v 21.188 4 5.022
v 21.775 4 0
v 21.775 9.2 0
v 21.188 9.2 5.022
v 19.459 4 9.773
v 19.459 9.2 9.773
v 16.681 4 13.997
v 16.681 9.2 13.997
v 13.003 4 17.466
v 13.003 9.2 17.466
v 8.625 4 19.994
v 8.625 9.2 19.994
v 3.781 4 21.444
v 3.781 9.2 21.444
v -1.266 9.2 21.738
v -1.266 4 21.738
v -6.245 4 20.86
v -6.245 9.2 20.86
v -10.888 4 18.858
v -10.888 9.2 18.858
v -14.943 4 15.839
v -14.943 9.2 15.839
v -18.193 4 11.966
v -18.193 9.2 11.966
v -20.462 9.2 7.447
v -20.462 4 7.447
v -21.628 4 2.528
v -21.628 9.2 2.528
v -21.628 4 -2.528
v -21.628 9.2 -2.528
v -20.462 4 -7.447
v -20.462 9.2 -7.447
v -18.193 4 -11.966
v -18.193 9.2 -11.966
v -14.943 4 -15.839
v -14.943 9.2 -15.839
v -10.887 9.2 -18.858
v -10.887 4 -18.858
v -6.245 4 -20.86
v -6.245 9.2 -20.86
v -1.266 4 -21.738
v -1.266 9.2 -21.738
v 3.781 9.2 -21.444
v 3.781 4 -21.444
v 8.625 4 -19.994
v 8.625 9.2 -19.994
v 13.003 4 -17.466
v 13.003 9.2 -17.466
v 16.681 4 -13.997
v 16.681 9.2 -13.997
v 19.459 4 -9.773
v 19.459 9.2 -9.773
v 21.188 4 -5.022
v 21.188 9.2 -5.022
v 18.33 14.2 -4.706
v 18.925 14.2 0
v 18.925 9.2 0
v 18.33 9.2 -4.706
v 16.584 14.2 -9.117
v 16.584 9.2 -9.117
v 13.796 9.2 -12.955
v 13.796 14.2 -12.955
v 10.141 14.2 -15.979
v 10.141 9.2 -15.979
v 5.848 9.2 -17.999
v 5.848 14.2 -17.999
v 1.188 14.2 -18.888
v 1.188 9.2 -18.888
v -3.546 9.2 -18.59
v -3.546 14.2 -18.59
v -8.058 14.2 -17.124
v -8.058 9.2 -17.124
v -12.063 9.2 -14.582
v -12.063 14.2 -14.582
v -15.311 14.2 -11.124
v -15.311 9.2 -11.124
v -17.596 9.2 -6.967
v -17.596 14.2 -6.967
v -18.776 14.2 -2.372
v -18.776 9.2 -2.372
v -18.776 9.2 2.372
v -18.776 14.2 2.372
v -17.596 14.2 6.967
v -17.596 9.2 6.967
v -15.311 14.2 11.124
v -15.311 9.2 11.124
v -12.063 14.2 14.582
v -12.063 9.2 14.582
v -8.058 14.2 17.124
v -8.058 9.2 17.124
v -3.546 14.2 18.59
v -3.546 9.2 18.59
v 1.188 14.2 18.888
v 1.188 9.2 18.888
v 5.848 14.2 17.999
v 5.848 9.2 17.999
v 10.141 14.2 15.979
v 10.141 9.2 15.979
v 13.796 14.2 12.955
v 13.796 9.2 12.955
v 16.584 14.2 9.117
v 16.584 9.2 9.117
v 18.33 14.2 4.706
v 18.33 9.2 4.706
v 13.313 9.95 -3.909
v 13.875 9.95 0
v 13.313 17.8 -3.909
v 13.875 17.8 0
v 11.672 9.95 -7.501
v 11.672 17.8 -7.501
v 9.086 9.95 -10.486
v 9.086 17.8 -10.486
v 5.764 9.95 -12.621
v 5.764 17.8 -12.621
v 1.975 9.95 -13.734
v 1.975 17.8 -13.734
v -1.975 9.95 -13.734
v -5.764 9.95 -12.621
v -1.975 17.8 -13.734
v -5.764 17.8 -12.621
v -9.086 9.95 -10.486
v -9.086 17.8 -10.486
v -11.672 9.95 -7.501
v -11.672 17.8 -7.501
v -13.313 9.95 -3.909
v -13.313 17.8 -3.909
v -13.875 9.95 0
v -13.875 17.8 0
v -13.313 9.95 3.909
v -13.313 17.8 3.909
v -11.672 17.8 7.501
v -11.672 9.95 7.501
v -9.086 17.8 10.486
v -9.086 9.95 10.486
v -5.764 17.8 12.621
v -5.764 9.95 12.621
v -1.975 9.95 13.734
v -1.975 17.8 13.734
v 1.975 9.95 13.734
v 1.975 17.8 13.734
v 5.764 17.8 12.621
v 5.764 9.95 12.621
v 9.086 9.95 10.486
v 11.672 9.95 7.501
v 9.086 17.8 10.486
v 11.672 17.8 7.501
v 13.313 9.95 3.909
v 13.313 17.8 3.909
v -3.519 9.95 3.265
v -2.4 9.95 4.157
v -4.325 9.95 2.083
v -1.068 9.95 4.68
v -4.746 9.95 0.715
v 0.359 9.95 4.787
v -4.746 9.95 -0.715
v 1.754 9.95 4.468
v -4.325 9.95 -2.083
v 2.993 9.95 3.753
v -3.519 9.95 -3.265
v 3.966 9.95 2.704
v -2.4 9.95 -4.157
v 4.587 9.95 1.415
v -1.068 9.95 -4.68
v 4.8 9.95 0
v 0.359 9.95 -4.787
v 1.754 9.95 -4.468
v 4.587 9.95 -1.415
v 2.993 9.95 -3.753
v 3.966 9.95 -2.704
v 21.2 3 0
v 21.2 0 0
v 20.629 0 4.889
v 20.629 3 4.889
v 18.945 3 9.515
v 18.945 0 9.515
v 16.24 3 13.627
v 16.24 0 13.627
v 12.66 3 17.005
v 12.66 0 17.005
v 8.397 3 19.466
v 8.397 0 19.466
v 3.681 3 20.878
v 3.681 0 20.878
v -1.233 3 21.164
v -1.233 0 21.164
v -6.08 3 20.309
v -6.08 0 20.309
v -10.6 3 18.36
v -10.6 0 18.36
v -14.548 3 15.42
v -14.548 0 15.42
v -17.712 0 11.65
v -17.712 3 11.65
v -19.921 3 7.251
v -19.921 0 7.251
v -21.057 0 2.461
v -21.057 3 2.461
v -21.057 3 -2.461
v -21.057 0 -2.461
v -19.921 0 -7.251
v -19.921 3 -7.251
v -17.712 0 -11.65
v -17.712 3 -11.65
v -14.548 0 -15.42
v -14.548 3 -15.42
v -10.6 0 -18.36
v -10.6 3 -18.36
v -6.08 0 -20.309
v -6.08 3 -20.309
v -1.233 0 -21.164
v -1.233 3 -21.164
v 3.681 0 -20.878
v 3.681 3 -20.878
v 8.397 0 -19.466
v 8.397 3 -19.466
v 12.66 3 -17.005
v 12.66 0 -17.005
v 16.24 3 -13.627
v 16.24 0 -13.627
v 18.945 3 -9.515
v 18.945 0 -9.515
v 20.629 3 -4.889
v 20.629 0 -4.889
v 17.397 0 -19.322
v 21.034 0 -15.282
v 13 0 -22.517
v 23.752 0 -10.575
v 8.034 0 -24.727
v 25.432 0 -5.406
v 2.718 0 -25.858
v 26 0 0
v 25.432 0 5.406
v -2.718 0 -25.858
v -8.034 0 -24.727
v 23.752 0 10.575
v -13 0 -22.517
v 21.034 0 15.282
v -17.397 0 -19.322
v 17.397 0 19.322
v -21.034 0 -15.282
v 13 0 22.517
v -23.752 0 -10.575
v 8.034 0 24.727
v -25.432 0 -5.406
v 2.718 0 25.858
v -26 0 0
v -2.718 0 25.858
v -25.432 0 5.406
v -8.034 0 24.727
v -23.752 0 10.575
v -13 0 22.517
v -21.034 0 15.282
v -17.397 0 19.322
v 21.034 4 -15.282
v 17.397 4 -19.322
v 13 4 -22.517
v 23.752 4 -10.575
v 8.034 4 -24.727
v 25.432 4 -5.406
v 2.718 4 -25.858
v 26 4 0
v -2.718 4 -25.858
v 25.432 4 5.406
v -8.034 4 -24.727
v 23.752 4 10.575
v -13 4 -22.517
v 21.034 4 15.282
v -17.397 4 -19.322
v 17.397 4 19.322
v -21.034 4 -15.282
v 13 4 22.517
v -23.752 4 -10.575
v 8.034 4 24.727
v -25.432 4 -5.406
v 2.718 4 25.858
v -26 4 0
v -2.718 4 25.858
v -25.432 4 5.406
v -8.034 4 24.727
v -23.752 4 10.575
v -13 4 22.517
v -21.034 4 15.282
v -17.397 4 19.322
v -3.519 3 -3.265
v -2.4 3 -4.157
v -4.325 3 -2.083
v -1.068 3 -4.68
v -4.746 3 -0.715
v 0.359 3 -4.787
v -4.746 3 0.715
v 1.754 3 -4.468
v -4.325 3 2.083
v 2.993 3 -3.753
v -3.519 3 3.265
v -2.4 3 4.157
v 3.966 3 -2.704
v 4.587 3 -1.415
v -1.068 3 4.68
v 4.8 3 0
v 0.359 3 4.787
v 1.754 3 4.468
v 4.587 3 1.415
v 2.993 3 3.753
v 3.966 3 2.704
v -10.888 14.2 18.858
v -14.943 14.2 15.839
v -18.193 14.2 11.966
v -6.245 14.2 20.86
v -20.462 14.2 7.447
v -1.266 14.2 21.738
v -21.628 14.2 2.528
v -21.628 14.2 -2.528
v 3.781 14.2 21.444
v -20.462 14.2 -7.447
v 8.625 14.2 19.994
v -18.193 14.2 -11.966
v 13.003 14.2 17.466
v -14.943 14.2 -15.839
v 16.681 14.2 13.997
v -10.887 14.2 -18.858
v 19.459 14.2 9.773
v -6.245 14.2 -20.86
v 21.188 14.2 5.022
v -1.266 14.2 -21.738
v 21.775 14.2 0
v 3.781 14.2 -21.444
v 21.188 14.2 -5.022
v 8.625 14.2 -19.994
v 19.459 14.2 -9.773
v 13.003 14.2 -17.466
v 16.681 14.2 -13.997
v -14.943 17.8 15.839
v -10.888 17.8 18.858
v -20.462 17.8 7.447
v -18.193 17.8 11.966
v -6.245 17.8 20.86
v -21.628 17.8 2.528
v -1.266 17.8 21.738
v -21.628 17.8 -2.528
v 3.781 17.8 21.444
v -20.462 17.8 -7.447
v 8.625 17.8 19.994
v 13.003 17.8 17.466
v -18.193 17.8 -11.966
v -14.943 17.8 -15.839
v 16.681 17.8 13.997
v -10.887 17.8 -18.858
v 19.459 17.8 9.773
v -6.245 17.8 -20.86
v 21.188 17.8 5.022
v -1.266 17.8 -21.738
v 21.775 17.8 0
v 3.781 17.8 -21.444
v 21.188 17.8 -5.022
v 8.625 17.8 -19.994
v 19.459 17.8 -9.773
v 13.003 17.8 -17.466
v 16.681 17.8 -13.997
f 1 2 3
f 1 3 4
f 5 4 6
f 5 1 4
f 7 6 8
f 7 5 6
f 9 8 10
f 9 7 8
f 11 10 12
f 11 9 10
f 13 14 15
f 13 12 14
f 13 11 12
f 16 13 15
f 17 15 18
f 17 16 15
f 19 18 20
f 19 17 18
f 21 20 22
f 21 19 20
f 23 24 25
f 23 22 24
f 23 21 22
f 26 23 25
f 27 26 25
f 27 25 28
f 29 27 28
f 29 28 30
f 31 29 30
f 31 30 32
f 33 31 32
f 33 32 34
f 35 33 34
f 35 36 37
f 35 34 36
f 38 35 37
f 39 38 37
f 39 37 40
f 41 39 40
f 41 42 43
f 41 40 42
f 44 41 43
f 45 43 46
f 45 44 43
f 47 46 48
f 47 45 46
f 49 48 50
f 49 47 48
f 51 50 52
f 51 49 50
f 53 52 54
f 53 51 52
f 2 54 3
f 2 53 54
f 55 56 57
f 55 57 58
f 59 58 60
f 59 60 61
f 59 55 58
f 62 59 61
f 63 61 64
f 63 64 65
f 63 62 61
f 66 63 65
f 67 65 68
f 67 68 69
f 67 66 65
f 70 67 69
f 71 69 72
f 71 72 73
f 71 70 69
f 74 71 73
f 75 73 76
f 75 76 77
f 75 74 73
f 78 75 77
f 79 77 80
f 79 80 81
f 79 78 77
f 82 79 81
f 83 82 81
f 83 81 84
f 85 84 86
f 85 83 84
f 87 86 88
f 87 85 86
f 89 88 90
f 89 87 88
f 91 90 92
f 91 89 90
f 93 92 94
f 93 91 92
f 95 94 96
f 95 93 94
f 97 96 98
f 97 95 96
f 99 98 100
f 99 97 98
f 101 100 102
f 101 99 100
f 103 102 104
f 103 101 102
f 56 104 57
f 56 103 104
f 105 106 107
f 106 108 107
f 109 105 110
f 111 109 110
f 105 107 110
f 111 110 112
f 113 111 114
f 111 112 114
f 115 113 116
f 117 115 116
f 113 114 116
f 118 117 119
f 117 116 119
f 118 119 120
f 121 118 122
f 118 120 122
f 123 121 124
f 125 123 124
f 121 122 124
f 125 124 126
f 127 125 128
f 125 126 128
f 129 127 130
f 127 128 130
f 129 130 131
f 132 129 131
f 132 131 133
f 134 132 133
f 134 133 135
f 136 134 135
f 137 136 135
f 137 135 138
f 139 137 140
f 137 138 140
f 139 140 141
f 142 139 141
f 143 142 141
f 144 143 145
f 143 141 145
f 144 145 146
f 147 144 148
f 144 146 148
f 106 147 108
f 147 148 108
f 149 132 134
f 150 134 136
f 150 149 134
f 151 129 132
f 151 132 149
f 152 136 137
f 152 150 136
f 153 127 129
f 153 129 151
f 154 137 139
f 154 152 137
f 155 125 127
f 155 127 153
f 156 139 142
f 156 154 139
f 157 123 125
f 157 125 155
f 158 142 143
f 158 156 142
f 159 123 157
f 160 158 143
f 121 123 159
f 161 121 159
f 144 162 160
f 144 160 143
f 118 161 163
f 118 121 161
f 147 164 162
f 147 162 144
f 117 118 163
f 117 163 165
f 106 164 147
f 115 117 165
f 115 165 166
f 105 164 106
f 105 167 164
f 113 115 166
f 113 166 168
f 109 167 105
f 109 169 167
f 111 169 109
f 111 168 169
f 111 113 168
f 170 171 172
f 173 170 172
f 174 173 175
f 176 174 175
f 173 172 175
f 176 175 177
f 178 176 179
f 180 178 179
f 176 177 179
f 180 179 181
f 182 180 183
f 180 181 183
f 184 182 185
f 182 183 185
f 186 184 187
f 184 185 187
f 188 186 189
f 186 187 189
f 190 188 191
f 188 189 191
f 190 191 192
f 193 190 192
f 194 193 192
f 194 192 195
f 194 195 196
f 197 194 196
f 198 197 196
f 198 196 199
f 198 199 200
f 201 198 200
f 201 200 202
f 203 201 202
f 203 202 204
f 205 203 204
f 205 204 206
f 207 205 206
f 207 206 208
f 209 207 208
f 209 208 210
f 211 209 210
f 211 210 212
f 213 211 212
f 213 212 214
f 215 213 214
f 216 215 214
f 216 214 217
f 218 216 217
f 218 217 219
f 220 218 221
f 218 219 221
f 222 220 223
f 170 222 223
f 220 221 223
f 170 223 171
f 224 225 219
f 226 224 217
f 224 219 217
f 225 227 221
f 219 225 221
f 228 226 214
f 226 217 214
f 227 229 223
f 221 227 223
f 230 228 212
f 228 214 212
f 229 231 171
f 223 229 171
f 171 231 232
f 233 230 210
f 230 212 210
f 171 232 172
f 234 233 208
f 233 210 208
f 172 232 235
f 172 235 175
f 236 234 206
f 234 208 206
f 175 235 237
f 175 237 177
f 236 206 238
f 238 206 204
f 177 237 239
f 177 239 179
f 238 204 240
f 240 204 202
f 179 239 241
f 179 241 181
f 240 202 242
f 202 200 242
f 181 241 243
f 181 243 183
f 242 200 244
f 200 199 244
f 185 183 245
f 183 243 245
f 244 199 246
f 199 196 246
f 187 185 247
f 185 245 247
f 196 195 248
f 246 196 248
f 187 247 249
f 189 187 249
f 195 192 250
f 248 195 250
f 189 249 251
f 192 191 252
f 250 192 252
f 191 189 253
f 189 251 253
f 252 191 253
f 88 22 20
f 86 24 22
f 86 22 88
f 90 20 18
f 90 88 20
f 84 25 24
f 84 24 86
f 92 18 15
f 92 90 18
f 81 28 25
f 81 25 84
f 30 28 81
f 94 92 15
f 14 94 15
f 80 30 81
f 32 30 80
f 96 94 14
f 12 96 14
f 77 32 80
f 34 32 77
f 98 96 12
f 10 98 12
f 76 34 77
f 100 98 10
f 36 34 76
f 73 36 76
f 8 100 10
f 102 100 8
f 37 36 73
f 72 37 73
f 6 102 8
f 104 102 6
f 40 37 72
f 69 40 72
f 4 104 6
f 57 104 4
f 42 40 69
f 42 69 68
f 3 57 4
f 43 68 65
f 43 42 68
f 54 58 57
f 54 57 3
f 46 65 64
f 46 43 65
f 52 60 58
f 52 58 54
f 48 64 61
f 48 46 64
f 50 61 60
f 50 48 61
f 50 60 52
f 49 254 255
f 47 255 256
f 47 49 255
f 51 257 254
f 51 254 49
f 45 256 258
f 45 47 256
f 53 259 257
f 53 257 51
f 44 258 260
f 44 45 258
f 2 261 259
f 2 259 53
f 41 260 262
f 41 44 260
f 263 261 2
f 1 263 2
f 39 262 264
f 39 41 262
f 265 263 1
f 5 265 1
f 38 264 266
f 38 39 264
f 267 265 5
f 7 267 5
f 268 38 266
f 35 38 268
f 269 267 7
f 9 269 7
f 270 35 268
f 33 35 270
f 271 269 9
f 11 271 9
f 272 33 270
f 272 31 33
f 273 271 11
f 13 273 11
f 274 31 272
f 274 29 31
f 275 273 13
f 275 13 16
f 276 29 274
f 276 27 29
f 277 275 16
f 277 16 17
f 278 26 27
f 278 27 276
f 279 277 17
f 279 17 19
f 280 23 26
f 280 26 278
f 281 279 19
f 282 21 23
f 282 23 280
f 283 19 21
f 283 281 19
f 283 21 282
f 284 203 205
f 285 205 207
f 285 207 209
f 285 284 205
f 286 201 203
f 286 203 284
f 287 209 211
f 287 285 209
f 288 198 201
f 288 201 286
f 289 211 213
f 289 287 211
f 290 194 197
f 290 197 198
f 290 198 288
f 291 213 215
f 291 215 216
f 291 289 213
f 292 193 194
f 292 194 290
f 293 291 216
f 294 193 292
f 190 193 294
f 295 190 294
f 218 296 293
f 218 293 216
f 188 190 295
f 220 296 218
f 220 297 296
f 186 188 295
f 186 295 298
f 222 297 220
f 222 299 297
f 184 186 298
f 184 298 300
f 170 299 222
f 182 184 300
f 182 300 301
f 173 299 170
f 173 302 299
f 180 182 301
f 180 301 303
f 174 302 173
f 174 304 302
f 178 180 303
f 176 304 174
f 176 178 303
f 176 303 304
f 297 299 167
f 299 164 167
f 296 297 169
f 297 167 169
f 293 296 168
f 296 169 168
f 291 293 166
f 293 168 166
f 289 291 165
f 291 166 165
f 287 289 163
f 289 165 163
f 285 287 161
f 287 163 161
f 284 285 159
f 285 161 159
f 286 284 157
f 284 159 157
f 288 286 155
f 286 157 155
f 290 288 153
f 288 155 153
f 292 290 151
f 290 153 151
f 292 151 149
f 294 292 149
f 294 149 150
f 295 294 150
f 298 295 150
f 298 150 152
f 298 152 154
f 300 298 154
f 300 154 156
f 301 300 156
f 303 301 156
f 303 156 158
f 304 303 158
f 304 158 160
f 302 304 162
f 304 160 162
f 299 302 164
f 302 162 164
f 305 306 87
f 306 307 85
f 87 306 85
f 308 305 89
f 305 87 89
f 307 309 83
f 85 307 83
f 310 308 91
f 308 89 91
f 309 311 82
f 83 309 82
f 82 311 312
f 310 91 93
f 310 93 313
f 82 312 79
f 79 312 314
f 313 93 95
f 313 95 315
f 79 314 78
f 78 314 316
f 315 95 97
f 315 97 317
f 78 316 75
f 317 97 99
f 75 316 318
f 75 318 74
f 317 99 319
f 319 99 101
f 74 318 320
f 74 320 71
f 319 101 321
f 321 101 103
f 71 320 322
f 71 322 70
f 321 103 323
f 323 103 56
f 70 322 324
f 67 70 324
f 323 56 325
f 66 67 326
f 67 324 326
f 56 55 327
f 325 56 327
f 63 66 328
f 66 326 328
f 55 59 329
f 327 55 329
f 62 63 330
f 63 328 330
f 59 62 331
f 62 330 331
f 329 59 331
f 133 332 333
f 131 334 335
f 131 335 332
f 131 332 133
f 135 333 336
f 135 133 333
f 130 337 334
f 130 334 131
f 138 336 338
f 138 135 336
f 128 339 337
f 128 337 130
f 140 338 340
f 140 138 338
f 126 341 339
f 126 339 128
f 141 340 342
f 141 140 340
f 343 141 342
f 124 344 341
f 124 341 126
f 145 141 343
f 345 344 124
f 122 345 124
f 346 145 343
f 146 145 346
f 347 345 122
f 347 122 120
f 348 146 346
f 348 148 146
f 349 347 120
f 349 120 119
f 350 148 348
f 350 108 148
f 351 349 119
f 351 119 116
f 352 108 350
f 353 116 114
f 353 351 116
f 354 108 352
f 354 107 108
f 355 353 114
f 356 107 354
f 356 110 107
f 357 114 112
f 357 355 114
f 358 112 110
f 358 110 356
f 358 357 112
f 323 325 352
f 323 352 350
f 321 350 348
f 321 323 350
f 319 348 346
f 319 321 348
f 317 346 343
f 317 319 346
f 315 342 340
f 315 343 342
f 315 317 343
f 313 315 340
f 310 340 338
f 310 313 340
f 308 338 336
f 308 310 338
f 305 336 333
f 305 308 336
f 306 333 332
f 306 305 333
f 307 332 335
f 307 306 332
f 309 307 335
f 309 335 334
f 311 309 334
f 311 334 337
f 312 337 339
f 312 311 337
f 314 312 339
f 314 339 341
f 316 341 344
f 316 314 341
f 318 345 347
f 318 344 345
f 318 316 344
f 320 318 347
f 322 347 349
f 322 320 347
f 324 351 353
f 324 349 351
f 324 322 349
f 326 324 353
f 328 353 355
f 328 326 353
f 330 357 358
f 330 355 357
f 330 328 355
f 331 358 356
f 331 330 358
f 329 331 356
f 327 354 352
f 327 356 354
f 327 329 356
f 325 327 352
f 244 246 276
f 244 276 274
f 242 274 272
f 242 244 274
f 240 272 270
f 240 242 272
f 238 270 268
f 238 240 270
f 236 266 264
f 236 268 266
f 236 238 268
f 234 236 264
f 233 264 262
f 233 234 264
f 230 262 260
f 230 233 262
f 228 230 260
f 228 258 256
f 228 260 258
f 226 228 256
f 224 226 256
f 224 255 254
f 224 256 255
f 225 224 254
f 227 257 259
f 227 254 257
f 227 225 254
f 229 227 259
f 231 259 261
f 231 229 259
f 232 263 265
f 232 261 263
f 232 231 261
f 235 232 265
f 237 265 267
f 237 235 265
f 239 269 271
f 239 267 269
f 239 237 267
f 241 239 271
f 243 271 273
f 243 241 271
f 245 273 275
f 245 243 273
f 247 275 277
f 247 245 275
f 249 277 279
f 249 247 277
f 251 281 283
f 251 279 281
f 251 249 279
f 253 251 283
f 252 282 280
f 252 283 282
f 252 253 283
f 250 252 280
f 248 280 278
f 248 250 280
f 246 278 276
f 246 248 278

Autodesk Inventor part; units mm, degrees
ref_plane "YZ Plane" through (0, 0, 0) normal (1, 0, 0) x (0, 1, 0)
ref_plane "XZ Plane" through (0, 0, 0) normal (0, 1, 0) x (-1, 0, 0)
sketch "Boceto1" plane through (0, 0, 0) normal (0, 1, 0) x (-1, 0, 0)
  circle A0 centre (0, 0) radius 26
  dimension "d0" = 52
extrude "Extrusión1" add sketch "Boceto1" along normal blind 4
sketch "Boceto2" plane through (0, 4, 0) normal (0, 1, 0) x (1, 0, 0)
  circle A0 centre (0, 0) radius 21.775
  dimension "d3" = 43.55
extrude "Extrusión2" add sketch "Boceto2" along normal blind 13.8
sketch "Boceto3" plane through (0, 17.8, 0) normal (0, 1, 0) x (1, 0, 0)
  circle A0 centre (0, 0) radius 13.875
  dimension "d6" = 27.75
extrude "Extrusión3" cut sketch "Boceto3" against normal blind 7.85
sketch "Boceto4" plane through (0, 9.95, 0) normal (0, 1, 0) x (1, 0, 0)
  circle A0 centre (0, 0) radius 4.8
  dimension "d9" = 9.6
extrude "Extrusión4" cut sketch "Boceto4" against normal blind 12
sketch "Boceto5" plane through (0, 0, 0) normal (0, -1, 0) x (1, 0, 0)
  circle A0 centre (0, 0) radius 21.2
  dimension "d12" = 42.4
extrude "Extrusión5" cut sketch "Boceto5" against normal blind 3
thread "Rosca1" size "M10x1.5" class "6H" standard "ANSI Metric M Profile" full length
ref_plane "Plano de trabajo1" through (0, 14.2, 0) normal (0, 1, 0) x (1, 0, 0)
sketch "Boceto6" plane through (0, 14.2, 0) normal (0, 1, 0) x (1, 0, 0)
  circle A0 centre (0, 0) radius 21.775
  circle A1 centre (0, 0) radius 18.925
  dimension "d18" = 37.85
extrude "Extrusión6" cut sketch "Boceto6" against normal blind 5
properties part number "Pieza_sonar"
